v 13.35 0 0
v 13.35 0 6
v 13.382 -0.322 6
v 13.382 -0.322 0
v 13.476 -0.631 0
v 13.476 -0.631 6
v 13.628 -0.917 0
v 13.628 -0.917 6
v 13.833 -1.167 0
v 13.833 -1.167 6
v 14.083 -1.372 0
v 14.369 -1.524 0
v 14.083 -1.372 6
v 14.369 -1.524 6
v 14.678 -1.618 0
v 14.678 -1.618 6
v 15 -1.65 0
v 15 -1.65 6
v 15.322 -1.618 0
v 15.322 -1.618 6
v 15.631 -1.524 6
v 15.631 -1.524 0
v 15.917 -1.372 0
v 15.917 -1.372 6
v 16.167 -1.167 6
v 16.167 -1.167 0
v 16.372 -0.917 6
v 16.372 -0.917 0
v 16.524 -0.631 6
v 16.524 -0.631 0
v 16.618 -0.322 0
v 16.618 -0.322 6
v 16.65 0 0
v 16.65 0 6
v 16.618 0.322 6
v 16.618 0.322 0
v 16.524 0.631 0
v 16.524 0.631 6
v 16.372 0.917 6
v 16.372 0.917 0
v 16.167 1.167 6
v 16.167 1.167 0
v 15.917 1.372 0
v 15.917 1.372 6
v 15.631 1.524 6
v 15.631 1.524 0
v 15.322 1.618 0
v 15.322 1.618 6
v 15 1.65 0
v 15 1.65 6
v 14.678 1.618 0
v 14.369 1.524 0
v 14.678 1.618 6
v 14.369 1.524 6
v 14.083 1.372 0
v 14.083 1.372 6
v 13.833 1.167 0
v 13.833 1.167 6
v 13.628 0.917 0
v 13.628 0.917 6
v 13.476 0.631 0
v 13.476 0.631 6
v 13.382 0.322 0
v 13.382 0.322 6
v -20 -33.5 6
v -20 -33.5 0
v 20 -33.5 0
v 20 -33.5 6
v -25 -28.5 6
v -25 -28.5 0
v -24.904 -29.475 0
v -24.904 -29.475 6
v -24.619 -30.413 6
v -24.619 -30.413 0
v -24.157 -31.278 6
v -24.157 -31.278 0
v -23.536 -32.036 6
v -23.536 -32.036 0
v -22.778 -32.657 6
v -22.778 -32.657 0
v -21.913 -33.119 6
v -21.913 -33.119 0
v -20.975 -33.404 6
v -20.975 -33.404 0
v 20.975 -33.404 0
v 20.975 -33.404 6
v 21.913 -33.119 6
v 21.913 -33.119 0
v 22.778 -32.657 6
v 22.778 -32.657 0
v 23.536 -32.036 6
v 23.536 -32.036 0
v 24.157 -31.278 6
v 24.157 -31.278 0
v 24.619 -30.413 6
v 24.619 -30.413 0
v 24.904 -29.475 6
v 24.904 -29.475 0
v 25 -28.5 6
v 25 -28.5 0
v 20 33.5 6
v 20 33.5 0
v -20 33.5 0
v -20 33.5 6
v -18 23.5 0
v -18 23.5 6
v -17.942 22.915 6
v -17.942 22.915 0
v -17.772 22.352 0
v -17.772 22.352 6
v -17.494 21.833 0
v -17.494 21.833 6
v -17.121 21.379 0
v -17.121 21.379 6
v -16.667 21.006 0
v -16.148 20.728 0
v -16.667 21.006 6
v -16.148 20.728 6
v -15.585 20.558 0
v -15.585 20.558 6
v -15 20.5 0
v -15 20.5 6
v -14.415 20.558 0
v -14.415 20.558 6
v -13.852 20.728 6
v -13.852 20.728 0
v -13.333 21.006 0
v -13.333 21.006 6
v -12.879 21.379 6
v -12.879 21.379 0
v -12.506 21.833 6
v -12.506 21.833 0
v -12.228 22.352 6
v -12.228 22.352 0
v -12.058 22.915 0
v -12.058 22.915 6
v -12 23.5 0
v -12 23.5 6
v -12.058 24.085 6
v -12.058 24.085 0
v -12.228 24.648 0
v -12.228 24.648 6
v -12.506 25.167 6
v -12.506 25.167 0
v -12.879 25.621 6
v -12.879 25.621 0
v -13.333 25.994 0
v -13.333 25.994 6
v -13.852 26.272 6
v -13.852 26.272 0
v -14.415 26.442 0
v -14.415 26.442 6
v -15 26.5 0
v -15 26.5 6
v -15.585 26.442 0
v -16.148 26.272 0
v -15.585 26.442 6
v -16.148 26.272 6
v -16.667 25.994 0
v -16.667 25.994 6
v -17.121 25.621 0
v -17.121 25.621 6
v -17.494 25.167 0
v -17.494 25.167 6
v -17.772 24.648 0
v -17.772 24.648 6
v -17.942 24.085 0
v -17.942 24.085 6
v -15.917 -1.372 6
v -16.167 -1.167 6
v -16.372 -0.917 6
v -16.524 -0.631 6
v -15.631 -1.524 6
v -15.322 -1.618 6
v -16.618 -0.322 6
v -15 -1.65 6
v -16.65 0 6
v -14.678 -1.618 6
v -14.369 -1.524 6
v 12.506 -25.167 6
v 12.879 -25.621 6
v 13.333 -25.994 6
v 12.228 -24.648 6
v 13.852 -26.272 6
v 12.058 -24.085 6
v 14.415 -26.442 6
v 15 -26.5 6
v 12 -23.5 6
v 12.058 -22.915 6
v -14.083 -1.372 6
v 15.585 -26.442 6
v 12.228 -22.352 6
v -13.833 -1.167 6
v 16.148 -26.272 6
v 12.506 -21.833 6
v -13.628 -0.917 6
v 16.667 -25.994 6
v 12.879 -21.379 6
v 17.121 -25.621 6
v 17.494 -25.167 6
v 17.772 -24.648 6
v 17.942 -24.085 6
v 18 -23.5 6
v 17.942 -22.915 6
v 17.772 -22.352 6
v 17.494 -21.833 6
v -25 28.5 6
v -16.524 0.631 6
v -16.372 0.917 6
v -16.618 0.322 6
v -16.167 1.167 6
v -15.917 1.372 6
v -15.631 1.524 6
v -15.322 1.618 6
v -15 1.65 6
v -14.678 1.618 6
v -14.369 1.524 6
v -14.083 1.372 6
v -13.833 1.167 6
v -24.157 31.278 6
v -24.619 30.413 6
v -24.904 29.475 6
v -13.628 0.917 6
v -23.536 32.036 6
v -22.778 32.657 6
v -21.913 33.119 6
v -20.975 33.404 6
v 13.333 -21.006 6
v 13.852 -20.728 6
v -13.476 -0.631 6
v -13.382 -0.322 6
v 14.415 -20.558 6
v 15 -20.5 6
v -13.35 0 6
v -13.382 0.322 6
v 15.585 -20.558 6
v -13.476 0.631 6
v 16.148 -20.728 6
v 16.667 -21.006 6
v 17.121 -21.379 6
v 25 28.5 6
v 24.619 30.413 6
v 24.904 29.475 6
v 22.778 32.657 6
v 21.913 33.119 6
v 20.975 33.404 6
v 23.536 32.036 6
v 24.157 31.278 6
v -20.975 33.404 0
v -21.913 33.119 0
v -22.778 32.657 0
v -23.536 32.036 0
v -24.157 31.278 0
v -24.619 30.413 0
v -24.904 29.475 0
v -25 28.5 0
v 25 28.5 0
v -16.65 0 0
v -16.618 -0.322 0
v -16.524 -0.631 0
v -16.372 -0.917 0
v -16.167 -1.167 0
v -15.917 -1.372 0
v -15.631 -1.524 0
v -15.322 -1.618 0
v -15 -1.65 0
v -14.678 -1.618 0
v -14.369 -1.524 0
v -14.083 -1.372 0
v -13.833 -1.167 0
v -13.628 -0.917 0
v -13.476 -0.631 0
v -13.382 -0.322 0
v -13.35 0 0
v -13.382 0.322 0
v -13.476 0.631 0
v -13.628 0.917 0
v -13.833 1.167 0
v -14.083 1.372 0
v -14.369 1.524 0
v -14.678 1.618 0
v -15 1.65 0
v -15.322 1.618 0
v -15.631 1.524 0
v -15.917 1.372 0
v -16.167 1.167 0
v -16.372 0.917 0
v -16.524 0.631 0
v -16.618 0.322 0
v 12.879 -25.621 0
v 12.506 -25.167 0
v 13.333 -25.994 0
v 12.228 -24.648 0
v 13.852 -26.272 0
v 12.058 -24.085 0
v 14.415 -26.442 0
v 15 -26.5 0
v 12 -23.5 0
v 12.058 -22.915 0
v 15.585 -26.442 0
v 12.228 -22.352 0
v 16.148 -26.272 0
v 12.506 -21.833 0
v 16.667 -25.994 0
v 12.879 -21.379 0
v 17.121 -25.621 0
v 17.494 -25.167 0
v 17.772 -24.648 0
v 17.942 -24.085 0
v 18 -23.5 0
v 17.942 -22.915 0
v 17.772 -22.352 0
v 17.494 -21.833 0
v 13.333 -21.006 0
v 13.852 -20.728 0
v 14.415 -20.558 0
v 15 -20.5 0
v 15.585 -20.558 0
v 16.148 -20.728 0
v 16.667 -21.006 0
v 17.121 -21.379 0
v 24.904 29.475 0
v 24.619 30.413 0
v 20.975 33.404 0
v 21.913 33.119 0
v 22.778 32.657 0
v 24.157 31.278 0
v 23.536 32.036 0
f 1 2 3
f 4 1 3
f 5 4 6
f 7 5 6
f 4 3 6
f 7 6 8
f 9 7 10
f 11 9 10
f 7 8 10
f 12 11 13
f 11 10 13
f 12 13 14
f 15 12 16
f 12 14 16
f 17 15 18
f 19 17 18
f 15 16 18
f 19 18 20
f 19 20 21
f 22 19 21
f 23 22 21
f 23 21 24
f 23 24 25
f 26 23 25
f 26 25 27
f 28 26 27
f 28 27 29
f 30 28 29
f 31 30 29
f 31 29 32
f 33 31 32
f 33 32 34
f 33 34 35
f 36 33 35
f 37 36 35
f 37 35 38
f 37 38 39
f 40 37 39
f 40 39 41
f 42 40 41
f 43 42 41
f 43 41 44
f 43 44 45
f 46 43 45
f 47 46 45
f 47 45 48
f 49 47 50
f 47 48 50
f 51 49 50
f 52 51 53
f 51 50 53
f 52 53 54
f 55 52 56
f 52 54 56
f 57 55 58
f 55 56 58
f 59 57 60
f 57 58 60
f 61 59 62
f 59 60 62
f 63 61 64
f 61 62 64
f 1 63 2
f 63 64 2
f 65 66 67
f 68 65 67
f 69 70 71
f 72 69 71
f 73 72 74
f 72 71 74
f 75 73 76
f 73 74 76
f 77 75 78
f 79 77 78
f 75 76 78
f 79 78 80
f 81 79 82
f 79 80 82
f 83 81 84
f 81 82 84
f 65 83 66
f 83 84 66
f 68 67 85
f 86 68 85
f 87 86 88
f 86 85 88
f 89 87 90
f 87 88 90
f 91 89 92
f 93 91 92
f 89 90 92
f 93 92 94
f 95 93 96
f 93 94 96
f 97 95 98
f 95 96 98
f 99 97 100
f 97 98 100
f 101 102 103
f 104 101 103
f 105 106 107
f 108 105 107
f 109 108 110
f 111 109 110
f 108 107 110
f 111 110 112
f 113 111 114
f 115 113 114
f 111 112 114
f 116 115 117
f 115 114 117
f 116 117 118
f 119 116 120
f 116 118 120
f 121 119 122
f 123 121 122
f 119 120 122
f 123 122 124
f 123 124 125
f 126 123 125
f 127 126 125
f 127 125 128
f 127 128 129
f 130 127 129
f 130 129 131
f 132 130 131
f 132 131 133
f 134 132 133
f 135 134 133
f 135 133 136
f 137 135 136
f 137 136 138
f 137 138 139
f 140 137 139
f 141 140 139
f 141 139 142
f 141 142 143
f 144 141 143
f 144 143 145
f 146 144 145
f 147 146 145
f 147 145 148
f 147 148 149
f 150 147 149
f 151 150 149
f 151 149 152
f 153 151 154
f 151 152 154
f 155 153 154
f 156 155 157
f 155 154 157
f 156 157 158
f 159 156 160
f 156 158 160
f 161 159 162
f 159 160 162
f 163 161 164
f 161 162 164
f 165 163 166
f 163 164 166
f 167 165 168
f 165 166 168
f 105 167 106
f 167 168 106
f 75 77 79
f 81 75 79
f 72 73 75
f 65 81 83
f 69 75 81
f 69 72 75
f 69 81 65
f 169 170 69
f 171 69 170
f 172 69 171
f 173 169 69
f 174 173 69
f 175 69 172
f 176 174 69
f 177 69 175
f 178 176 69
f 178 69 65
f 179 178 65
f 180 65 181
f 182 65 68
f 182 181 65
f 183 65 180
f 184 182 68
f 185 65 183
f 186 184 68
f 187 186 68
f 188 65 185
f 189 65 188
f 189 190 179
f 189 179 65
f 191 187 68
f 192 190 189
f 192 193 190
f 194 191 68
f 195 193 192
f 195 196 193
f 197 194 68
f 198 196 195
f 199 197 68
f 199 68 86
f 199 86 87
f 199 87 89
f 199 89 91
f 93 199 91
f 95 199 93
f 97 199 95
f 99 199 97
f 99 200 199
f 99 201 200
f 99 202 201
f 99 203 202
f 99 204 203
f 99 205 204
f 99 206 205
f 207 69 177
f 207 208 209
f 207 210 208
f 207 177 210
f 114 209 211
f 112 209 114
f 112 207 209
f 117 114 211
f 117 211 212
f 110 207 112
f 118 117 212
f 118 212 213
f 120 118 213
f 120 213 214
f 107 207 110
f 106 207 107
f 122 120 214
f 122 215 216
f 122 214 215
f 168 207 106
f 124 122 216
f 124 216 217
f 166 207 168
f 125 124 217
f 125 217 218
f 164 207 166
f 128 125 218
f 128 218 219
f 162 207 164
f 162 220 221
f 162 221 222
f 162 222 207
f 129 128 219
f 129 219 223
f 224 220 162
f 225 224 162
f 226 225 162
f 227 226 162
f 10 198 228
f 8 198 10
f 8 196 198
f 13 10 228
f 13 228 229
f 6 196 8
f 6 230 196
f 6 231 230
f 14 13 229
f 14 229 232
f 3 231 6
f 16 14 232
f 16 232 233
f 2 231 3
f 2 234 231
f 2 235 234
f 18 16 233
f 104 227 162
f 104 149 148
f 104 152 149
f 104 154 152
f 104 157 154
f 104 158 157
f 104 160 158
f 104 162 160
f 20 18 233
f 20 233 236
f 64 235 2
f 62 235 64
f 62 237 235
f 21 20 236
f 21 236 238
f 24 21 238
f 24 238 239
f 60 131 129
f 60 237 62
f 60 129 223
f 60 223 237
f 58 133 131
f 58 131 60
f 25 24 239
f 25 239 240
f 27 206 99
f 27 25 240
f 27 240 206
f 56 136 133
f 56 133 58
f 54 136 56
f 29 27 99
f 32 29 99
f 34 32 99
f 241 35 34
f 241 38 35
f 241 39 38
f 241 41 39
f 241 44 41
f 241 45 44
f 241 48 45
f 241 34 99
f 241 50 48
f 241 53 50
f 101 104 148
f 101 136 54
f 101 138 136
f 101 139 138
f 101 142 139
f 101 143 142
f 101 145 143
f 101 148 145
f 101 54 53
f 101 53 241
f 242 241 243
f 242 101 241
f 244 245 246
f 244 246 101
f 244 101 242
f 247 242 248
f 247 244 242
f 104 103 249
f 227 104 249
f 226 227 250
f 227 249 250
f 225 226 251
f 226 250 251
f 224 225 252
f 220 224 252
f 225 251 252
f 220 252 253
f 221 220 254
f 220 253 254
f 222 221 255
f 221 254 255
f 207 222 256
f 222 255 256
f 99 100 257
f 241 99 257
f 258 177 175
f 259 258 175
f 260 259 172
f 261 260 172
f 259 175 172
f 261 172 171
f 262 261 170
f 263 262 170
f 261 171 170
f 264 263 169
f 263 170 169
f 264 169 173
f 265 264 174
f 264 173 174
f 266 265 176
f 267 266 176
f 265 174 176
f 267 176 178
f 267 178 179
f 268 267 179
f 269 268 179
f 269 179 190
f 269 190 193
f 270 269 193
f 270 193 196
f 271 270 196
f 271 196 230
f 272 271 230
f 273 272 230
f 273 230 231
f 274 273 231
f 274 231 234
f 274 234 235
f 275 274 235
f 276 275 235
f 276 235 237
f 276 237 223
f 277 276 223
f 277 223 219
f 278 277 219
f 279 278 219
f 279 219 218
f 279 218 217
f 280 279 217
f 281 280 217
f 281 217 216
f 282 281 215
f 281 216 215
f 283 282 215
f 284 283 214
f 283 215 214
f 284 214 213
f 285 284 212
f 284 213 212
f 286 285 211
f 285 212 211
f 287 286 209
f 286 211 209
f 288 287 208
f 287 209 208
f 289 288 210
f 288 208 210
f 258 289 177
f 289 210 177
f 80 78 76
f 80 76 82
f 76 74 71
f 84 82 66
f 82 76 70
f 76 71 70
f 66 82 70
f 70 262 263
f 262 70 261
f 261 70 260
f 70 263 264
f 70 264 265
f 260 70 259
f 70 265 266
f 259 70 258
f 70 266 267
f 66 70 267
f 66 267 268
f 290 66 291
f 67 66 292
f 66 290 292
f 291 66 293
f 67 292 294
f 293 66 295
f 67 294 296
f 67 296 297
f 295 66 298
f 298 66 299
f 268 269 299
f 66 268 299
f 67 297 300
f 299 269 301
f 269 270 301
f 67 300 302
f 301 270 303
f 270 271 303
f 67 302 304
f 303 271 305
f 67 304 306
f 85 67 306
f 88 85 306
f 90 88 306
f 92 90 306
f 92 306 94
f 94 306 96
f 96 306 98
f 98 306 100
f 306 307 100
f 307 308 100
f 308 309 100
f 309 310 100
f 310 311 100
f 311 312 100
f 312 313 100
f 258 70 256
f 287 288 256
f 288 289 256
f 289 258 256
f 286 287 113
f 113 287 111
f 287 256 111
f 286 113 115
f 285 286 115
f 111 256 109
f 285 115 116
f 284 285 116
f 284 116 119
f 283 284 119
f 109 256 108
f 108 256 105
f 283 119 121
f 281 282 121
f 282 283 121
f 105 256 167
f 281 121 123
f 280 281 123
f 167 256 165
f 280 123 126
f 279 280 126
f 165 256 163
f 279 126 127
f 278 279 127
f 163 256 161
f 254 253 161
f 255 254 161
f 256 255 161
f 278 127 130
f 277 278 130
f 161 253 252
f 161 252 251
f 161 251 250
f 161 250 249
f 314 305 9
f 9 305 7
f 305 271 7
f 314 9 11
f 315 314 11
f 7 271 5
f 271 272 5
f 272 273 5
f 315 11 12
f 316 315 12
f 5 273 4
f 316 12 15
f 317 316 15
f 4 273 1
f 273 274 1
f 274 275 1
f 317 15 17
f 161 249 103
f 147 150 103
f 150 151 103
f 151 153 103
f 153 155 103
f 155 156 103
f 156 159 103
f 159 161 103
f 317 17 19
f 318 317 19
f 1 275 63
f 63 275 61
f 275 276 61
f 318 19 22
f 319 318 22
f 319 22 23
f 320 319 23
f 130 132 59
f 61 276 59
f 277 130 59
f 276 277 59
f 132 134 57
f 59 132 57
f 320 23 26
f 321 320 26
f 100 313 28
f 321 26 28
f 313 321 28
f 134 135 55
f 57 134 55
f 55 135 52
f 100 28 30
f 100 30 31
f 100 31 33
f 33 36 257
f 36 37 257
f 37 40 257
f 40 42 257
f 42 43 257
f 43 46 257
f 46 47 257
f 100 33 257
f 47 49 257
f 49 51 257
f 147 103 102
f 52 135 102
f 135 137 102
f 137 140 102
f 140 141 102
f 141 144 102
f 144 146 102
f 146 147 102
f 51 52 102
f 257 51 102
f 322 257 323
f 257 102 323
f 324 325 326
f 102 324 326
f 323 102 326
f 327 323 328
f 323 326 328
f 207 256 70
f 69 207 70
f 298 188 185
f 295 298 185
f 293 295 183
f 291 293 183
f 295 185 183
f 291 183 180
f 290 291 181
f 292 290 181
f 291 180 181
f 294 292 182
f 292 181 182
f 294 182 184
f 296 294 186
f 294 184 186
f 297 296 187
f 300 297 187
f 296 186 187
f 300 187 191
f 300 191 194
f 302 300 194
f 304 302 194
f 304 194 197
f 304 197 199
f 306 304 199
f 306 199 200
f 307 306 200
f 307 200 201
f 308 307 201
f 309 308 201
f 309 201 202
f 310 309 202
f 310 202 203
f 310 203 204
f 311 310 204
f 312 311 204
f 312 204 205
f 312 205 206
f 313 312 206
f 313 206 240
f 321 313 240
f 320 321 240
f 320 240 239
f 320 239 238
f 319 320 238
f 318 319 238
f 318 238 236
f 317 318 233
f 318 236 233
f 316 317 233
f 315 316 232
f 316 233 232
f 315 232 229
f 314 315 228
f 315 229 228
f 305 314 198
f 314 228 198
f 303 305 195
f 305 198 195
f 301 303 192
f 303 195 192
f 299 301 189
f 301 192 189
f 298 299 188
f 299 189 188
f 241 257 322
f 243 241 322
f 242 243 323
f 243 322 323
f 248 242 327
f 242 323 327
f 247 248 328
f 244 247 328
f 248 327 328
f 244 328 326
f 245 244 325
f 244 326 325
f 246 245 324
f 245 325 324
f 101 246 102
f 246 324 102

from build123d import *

# Parameters (mm, degrees)
F1_DEPTH = 6
F2_D     = 3.3
F3_D     = 6


with BuildPart() as f1:
    # F0 (on Top) → F1 (new body)
    with BuildSketch(Plane.XY):
        with BuildLine():
            ThreePointArc((25, 28.5), (23.5355339059, 32.0355339059), (20, 33.5))
            Line((20, 33.5), (-20, 33.5))
            ThreePointArc((-20, 33.5), (-23.5355339059, 32.0355339059), (-25, 28.5))
            Line((-25, 28.5), (-25, -28.5))
            ThreePointArc((-25, -28.5), (-23.5355339059, -32.0355339059), (-20, -33.5))
            Line((-20, -33.5), (20, -33.5))
            ThreePointArc((20, -33.5), (23.5355339059, -32.0355339059), (25, -28.5))
            Line((25, -28.5), (25, 28.5))
        make_face()
    extrude(amount=F1_DEPTH)

    # F2 (through all)
    with Locations(Plane(origin=(0, 0, 0), x_dir=(1, 0, 0), z_dir=(0, 0, -1))):
        with Locations((-15, 0), (15, 0)):
            Hole(F2_D / 2)

    # F3 (through all)
    with Locations(Plane(origin=(0, 0, 0), x_dir=(1, 0, 0), z_dir=(0, 0, -1))):
        with Locations((-15, -23.5), (15, 23.5)):
            Hole(F3_D / 2)


solid = f1.part
